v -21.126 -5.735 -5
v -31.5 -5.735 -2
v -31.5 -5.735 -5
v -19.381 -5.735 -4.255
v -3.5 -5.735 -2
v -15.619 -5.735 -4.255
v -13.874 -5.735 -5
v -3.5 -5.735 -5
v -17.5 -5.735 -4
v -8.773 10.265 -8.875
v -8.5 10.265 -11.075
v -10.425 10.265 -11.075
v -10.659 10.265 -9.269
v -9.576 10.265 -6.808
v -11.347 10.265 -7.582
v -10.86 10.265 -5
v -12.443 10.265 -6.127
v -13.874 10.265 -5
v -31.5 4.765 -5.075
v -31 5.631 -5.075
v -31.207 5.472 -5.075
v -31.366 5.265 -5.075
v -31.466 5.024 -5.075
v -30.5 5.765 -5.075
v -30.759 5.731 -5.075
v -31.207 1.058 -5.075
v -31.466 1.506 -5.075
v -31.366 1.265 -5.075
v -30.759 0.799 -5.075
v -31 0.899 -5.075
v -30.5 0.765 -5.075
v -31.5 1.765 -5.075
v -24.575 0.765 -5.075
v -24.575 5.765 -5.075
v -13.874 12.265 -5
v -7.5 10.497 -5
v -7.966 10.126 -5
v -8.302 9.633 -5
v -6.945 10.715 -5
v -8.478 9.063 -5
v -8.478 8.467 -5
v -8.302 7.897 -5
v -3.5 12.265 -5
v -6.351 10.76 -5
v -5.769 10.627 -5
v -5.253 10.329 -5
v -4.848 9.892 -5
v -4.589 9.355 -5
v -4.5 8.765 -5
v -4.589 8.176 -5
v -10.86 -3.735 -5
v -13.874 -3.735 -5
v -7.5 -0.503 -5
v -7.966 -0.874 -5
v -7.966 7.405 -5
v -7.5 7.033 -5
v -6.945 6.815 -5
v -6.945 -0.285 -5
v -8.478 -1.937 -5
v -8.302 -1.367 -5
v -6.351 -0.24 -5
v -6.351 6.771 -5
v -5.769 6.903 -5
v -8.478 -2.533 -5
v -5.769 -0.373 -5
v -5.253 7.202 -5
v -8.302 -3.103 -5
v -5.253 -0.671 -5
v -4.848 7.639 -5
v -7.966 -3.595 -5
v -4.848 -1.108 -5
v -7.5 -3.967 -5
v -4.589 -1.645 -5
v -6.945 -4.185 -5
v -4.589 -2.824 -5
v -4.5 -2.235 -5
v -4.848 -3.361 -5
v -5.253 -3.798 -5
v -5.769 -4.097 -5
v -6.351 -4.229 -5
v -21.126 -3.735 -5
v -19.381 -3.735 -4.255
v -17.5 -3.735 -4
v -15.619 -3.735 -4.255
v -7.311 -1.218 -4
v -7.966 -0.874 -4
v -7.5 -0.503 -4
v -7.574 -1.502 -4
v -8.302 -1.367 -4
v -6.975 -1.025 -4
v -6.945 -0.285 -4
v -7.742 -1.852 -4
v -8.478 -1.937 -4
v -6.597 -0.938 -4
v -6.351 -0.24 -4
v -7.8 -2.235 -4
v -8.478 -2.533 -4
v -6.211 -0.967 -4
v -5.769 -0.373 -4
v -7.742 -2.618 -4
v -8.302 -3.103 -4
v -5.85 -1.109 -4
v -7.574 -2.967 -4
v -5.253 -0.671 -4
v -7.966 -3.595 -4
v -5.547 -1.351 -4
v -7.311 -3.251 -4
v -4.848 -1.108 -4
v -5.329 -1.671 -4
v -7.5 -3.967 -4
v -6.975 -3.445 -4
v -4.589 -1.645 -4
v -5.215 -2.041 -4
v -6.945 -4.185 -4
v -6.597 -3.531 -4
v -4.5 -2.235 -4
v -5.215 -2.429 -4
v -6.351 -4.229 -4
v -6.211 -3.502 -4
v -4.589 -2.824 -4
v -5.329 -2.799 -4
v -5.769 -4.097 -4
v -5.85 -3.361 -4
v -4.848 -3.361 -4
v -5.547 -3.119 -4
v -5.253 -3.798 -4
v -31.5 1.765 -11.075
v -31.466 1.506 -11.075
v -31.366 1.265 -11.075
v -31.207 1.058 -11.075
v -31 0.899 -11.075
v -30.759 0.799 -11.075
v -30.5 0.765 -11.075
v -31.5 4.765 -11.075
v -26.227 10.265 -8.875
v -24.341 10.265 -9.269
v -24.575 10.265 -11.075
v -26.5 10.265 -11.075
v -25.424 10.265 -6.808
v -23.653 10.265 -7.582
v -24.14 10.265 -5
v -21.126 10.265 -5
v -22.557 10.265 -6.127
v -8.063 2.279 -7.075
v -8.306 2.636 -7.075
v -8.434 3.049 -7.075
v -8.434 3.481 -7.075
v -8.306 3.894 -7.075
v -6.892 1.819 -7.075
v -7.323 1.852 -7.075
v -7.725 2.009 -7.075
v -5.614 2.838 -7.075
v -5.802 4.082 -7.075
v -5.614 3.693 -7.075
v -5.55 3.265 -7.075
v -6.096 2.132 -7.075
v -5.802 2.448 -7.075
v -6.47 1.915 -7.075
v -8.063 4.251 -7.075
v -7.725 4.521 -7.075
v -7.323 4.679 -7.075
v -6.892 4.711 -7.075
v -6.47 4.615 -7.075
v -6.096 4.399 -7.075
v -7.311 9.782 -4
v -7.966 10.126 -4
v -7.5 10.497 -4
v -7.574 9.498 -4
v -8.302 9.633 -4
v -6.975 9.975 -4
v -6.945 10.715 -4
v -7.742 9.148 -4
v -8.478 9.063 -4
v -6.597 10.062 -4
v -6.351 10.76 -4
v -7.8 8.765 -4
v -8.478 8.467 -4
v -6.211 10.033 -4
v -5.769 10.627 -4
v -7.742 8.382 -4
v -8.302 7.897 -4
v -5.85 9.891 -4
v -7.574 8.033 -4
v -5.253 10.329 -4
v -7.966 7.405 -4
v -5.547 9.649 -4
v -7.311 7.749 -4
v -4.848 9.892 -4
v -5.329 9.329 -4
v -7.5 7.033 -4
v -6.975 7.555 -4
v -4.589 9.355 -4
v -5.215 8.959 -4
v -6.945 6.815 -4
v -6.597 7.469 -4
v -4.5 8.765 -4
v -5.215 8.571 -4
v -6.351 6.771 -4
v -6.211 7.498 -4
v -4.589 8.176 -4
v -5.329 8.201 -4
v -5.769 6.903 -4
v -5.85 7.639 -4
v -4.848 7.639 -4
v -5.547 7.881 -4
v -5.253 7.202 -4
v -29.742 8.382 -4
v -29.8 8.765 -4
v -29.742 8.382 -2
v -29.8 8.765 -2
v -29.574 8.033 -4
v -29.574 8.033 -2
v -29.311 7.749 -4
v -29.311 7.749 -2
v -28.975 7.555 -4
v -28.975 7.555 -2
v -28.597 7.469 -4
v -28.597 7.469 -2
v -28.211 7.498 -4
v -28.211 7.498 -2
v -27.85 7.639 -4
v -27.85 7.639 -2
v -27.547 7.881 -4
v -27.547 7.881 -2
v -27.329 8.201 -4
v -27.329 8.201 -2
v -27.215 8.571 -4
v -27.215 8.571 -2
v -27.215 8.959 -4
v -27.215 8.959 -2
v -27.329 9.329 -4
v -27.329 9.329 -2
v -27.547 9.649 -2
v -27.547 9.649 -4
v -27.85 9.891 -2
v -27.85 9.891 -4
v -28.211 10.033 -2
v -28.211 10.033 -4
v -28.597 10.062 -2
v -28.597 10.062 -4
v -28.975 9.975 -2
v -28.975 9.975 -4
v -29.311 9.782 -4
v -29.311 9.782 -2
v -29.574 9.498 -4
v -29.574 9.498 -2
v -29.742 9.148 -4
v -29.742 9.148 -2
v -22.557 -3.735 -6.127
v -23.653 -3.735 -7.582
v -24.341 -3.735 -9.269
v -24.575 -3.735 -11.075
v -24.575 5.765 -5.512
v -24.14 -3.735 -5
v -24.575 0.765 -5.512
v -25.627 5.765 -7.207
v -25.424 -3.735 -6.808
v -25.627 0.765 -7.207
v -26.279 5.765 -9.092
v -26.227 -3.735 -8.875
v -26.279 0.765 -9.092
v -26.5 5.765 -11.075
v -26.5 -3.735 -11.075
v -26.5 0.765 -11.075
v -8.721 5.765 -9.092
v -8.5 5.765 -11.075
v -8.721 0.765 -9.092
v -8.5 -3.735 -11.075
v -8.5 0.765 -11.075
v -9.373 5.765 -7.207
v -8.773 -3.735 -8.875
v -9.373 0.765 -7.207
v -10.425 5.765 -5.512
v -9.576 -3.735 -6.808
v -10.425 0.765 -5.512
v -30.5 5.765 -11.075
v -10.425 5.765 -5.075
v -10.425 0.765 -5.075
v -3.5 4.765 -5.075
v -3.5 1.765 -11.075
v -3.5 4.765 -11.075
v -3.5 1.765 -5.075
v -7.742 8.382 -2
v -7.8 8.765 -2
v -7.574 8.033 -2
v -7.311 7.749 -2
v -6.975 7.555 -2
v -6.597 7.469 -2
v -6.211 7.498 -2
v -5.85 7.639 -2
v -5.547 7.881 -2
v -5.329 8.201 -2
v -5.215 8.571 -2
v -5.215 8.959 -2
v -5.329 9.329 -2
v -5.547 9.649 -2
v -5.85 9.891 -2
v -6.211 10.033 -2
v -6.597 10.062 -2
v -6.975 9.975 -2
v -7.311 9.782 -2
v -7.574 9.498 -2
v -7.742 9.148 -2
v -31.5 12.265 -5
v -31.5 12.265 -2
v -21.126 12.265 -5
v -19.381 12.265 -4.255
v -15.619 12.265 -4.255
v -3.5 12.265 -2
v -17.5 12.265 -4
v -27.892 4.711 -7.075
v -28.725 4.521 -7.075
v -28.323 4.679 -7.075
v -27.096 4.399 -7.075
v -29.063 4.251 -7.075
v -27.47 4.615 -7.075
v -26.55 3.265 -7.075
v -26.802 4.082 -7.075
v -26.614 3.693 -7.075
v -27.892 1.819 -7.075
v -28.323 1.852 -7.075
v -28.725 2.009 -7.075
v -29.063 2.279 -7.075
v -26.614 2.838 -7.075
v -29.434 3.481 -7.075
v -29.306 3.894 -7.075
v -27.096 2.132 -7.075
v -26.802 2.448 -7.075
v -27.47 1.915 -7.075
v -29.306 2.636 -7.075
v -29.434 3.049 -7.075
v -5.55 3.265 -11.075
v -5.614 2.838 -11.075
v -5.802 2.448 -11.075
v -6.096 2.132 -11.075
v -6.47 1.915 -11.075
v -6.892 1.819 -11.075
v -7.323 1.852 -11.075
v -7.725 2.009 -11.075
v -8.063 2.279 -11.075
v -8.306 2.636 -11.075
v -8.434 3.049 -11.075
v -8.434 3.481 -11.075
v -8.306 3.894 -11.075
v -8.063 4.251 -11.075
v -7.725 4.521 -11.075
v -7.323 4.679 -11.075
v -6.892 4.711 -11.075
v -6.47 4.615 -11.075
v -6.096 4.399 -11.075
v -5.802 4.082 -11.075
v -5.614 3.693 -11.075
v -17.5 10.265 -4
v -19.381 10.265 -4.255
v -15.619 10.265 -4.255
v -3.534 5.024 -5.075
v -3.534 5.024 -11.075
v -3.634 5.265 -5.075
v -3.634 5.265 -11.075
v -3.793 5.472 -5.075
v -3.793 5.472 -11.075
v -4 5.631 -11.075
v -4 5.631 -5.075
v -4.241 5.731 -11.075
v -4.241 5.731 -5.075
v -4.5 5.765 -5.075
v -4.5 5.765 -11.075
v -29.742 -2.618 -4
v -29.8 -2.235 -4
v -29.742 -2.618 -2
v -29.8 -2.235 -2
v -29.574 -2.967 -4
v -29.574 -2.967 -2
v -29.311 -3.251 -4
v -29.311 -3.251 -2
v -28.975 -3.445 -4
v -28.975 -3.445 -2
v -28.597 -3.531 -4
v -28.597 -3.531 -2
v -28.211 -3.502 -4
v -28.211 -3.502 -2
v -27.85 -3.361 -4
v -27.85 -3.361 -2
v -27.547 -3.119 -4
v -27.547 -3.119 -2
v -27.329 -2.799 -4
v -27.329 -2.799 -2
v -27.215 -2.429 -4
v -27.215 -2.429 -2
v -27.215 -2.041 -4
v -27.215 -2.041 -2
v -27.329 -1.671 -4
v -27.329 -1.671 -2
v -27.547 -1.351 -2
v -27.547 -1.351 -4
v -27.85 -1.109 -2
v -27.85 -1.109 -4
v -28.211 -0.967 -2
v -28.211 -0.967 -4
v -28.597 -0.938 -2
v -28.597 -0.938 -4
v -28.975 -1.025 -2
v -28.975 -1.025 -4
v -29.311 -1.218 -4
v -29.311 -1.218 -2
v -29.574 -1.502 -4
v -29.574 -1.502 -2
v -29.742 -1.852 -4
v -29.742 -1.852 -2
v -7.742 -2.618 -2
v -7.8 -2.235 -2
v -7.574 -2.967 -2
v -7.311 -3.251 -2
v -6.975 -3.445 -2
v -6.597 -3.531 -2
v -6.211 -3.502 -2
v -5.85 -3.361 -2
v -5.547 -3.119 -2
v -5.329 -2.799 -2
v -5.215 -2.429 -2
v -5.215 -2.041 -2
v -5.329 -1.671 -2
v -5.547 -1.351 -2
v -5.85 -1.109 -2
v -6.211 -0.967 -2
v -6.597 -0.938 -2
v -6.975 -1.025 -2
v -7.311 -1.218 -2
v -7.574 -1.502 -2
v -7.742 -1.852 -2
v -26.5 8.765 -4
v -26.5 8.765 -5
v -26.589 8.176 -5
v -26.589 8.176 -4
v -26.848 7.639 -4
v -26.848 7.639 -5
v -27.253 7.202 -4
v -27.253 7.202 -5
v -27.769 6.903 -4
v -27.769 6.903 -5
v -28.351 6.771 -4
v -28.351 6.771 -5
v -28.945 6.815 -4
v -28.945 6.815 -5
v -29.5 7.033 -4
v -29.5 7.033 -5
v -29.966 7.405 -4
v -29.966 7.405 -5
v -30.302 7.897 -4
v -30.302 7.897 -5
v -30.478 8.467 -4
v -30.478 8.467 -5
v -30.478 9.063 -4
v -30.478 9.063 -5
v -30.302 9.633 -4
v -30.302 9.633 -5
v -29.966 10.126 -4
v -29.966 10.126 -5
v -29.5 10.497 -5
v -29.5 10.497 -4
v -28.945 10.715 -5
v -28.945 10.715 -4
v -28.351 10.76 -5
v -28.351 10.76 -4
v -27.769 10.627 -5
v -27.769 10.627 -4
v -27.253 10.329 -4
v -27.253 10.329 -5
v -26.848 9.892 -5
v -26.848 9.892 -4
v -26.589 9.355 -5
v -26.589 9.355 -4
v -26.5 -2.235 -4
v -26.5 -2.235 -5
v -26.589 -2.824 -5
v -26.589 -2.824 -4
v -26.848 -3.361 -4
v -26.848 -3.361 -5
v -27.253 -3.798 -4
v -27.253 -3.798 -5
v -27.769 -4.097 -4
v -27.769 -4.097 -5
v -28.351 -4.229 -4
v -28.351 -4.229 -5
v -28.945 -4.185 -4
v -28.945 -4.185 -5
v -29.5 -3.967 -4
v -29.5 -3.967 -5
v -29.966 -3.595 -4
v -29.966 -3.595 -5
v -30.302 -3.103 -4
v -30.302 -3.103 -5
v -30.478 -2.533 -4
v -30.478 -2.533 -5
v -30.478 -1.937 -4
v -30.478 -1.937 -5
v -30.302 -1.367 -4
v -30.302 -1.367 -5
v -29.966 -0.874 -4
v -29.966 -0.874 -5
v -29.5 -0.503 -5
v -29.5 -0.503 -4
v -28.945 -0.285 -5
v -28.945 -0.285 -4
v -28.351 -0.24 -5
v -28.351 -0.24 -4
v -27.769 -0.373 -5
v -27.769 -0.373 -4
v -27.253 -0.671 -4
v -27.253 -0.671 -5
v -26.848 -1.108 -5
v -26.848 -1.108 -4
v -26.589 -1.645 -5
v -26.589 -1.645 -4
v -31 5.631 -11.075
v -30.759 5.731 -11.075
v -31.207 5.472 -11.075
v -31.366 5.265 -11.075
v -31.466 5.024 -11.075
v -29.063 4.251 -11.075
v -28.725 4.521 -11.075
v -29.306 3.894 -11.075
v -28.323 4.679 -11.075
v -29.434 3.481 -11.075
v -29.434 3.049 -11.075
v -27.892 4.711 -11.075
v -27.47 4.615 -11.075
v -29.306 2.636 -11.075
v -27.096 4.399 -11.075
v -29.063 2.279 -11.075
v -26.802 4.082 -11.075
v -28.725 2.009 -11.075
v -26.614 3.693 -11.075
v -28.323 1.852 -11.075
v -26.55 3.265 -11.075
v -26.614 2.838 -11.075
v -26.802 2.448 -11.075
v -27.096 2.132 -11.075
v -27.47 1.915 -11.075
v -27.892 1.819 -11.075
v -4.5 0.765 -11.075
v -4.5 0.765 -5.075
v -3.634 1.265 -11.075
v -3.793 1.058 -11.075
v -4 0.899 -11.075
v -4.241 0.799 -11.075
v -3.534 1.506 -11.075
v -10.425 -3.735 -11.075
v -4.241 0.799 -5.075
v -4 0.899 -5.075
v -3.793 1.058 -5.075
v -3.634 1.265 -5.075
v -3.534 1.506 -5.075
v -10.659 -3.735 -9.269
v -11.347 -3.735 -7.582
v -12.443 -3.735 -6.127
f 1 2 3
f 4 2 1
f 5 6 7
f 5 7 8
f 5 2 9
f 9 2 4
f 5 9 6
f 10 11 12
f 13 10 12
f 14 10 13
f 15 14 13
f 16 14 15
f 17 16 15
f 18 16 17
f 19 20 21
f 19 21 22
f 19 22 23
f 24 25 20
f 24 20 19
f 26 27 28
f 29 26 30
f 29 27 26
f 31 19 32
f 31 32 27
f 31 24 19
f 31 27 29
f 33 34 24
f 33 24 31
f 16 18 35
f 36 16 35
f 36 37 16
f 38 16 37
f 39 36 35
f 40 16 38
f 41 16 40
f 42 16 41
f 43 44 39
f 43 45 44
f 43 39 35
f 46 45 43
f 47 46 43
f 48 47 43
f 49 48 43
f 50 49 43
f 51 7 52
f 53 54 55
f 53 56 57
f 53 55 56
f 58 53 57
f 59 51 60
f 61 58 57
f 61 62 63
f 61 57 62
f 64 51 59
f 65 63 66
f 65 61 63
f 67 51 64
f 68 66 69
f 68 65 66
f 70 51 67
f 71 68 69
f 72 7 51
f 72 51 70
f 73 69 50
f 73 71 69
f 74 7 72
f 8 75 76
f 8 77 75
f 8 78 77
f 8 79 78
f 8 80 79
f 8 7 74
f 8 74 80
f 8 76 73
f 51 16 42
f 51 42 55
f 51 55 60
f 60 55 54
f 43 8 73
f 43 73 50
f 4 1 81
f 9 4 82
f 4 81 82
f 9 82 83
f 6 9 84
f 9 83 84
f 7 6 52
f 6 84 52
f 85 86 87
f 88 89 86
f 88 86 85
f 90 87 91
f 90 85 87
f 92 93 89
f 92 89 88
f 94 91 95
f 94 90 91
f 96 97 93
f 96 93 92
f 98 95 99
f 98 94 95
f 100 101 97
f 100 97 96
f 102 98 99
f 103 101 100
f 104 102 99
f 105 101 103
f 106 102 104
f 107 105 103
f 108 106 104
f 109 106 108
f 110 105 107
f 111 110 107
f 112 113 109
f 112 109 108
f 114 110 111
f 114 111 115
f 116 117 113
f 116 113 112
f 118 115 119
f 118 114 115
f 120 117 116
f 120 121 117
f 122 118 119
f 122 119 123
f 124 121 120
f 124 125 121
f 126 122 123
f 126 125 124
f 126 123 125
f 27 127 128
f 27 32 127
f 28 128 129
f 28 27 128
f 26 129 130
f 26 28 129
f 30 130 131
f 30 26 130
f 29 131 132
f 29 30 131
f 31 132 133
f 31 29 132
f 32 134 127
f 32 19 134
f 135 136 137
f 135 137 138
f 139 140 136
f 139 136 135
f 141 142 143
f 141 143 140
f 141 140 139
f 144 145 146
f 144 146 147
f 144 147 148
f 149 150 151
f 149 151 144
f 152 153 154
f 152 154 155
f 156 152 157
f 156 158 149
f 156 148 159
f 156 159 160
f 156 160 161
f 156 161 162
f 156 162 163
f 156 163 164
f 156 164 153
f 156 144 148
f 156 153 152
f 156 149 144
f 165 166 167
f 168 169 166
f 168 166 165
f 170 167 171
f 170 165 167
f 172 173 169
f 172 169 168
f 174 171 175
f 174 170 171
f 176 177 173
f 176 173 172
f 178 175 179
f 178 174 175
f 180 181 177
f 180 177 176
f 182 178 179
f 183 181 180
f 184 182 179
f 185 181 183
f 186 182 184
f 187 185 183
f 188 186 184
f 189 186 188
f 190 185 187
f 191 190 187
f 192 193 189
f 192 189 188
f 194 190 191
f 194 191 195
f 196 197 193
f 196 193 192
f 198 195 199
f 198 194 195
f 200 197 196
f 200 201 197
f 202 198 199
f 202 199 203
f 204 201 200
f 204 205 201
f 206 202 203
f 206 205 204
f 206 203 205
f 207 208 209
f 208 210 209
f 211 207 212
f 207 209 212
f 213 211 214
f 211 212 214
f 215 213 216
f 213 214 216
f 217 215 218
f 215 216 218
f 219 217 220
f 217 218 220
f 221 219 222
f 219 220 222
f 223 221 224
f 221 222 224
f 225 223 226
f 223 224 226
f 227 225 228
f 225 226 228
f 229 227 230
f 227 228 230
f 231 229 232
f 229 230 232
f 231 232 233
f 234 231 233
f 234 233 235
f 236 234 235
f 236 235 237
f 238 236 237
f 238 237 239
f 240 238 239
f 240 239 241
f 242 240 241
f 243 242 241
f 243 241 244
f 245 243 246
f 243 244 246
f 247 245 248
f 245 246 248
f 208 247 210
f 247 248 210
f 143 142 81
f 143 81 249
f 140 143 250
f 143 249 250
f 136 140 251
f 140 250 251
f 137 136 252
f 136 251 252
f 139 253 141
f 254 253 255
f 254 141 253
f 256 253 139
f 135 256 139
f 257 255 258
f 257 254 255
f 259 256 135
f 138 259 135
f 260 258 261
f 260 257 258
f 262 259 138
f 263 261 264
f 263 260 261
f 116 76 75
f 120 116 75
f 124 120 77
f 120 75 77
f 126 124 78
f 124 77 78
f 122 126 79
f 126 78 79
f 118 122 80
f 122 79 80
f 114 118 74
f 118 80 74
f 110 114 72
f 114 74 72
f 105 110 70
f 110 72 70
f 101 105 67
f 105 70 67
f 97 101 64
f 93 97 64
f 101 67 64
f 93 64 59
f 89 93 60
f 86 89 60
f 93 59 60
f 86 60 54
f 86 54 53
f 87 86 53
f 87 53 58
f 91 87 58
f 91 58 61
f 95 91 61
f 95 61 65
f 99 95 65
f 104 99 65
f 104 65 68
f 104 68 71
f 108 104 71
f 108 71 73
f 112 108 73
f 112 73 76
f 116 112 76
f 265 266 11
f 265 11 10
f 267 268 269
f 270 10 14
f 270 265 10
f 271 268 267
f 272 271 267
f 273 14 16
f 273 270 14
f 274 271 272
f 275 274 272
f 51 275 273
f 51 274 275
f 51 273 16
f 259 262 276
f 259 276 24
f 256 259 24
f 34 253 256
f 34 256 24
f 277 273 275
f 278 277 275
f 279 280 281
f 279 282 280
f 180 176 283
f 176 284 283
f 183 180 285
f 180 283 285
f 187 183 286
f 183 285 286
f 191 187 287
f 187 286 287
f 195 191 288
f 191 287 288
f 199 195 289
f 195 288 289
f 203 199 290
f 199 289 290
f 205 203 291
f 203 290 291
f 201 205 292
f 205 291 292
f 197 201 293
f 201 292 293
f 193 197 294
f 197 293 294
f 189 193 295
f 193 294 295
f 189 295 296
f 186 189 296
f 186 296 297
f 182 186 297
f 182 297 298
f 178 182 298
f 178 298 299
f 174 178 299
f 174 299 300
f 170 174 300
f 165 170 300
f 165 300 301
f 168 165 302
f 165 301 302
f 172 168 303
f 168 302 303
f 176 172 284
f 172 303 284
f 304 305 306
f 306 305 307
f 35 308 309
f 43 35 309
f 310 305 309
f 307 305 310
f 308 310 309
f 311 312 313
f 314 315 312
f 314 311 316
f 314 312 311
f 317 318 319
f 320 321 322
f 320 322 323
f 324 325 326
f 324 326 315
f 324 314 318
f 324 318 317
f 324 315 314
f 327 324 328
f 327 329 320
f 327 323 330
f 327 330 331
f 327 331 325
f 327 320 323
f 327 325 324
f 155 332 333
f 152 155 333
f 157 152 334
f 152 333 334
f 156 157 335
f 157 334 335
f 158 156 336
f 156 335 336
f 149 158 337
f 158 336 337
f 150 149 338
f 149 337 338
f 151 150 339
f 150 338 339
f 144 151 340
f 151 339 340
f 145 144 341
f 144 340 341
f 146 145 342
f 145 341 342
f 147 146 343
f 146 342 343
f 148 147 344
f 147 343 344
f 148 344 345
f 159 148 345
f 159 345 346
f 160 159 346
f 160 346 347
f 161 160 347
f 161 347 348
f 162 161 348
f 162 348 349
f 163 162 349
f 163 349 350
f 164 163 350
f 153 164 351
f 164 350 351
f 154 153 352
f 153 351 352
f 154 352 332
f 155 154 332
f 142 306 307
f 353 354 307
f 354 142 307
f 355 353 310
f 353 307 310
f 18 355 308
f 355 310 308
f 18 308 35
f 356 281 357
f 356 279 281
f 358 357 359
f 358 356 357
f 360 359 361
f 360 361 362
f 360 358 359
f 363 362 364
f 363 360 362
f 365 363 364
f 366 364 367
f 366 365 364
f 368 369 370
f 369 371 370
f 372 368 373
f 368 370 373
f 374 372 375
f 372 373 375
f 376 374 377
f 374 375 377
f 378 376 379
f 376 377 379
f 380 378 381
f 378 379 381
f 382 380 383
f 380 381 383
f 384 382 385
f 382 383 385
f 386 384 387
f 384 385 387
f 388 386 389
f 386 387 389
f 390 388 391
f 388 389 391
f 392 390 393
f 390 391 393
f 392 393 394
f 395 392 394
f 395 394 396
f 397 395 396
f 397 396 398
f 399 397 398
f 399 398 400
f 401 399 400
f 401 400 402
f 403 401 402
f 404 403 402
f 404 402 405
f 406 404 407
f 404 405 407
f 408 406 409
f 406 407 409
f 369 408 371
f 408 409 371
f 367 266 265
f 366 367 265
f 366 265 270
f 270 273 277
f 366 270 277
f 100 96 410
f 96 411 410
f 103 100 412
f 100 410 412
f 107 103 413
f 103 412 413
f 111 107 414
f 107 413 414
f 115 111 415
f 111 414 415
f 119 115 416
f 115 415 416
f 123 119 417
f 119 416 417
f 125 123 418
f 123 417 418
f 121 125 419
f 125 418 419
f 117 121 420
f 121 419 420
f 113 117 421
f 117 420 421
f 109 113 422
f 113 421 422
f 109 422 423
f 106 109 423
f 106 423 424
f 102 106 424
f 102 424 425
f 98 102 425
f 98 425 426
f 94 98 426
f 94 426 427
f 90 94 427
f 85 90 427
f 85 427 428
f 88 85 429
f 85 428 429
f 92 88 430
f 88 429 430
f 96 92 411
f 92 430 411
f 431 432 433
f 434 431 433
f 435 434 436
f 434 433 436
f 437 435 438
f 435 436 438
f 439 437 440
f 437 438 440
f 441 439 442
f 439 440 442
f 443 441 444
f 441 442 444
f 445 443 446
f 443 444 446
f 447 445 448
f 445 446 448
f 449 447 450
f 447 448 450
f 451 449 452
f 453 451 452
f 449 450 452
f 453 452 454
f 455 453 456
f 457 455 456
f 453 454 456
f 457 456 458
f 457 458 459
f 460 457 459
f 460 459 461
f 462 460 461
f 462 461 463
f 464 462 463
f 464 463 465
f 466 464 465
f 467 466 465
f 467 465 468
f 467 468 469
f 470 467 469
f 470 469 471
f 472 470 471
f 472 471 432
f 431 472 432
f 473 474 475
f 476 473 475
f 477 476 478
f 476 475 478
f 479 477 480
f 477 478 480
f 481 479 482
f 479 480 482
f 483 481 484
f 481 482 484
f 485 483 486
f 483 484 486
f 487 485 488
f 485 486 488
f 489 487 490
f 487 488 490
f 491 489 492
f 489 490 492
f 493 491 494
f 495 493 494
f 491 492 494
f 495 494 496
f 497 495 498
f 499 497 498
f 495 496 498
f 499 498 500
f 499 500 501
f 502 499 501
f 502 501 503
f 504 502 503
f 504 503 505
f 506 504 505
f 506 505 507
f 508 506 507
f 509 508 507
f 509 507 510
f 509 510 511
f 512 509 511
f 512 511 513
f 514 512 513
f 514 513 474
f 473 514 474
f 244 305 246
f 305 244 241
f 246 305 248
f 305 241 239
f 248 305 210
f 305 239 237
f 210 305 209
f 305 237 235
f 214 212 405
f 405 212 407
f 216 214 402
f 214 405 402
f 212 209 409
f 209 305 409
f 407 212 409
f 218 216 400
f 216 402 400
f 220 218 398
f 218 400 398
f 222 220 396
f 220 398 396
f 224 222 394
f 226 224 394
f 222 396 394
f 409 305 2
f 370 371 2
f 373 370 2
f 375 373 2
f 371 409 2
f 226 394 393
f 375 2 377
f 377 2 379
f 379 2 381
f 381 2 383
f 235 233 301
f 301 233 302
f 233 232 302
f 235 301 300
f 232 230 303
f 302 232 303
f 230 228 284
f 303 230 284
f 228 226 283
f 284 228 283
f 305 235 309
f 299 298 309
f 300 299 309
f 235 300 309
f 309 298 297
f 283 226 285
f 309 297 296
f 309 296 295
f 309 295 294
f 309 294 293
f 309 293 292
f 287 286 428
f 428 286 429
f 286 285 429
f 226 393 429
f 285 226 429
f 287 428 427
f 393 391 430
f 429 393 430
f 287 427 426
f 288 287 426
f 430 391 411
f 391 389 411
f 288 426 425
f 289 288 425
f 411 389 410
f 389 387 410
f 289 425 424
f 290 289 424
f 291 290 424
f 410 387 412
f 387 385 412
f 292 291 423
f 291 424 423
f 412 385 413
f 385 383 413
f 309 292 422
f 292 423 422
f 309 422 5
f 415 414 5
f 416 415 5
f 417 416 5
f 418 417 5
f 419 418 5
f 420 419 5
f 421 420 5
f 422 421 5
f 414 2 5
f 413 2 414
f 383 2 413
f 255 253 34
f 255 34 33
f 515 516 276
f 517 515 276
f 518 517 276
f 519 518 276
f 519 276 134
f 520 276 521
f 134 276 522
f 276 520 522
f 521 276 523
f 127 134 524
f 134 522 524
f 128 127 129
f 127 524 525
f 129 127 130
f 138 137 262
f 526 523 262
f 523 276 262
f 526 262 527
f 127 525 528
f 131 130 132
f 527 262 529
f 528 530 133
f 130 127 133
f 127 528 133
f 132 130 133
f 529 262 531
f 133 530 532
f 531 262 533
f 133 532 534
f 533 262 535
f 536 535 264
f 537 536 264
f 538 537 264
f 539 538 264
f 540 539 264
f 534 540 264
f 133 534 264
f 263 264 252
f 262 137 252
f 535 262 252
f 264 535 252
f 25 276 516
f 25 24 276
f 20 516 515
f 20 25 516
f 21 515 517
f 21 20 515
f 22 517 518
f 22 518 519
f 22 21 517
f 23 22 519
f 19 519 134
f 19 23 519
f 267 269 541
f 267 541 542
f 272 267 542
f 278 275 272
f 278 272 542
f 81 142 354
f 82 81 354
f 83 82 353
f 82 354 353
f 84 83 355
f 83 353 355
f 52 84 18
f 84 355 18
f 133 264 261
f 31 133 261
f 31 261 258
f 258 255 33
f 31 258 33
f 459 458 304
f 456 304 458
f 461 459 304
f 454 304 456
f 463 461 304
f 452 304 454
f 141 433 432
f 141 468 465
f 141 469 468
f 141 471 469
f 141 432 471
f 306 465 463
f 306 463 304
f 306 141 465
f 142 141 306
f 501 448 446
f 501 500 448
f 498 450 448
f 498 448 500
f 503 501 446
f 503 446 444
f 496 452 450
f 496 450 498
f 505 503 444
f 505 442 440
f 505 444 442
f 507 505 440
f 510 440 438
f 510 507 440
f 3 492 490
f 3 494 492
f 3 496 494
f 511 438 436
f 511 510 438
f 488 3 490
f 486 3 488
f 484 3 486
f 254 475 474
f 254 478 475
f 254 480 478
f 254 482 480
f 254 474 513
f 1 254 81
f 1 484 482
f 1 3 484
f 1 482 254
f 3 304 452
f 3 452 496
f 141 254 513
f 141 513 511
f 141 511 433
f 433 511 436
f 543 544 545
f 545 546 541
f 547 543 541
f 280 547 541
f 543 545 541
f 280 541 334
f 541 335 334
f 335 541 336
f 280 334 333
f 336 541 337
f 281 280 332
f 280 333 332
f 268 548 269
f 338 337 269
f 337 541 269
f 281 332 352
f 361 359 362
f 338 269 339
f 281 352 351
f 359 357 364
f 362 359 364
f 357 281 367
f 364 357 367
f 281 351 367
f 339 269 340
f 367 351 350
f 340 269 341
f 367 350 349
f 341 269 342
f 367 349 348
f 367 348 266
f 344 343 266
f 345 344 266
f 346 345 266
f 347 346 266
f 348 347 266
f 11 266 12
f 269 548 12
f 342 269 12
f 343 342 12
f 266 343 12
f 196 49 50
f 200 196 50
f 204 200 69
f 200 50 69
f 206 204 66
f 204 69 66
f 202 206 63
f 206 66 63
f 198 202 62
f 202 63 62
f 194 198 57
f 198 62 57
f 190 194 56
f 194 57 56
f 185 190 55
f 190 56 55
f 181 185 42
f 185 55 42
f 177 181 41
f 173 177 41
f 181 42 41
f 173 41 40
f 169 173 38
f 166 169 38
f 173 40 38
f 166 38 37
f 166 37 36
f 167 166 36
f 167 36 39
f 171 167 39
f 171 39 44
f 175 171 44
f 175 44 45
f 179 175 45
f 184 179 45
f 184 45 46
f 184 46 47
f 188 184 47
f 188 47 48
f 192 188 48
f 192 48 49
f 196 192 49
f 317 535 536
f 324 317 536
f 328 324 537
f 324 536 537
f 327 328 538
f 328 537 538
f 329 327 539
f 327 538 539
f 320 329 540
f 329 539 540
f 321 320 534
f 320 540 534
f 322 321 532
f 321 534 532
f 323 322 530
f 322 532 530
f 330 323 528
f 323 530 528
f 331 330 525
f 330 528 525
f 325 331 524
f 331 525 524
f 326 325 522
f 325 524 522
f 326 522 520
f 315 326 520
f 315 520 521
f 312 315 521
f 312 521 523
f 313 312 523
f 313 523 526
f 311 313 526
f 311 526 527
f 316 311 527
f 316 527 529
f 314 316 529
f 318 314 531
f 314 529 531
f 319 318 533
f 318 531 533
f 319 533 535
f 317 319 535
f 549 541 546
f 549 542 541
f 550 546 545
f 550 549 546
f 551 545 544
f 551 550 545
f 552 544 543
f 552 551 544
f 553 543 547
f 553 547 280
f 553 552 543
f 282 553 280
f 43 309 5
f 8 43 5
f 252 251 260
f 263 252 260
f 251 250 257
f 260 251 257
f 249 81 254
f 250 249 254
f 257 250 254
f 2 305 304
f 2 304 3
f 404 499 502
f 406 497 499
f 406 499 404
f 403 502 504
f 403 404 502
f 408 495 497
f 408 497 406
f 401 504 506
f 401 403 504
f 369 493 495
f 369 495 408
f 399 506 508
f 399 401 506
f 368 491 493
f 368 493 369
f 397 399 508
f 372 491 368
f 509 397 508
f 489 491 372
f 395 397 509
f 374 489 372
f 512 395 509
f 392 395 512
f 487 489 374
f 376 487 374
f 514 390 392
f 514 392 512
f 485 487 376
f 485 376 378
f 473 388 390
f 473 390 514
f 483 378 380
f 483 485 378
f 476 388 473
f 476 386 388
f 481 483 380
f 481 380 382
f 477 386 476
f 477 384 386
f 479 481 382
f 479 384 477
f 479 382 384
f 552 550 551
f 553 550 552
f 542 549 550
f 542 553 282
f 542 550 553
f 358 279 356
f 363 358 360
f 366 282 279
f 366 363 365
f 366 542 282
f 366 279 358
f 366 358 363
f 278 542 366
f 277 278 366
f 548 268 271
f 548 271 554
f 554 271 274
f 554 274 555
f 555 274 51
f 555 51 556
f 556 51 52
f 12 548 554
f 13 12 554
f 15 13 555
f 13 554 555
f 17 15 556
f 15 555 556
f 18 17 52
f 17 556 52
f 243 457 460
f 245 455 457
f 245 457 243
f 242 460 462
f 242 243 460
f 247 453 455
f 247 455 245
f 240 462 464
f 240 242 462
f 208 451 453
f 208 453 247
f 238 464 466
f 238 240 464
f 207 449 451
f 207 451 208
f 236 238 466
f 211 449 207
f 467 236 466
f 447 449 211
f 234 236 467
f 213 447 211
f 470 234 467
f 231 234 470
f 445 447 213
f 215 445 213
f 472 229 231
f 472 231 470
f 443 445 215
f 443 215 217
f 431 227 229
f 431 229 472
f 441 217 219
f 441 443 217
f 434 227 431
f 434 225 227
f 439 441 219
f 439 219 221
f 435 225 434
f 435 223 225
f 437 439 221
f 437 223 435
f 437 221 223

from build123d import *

# Parameters (mm, degrees)
SKETCH048_W         = 28
SKETCH048_H         = 18
PAD032_DEPTH        = 3
SKETCH049_R         = 7.075
POCKET009_DEPTH     = 18.001
PAD033_START        = -2
PAD033_DEPTH        = 14
SKETCH051_W         = 1.925
SKETCH051_H         = 5
PAD034_DEPTH        = 6
SKETCH052_W         = 5
SKETCH052_H         = 6
PAD035_DEPTH        = 5
SKETCH053_W         = 5
SKETCH053_H         = 6
PAD036_DEPTH        = 5
HOLE004_D           = 2.6
HOLE004_DEPTH       = 25
HOLE004_CBORE_D     = 4
HOLE004_CBORE_DEPTH = 1
SKETCH056_R         = 1.45
POCKET010_DEPTH     = 4
FILLET013_R         = 1
FILLET014_R         = 1


with BuildPart() as part:
    # Sketch048 (on Face1 of CopyPad022) → Pad032 (new body)
    with BuildSketch(Plane(origin=(0, 0, -2), x_dir=(1, 0, 0), z_dir=(0, 0, -1))):
        with Locations((-18.5, 29.3848)):
            Rectangle(SKETCH048_W, SKETCH048_H)
    extrude(amount=PAD032_DEPTH)

    # Sketch049 (on Face2 of Pad032) → Pocket009 (cut, through all)
    with BuildSketch(Plane(origin=(0, -20.3848, -2), x_dir=(-1, 0, 0), z_dir=(0, 1, 0))):
        with Locations((18.5, -9.075)):
            Circle(SKETCH049_R)
    extrude(amount=-POCKET009_DEPTH, mode=Mode.SUBTRACT)

    # Sketch050 (on Face2 of Pocket009) → Pad033 (join)
    with BuildSketch(Plane(origin=(0, -38.3848, -2), x_dir=(1, 0, 0), z_dir=(0, -1, 0)).offset(PAD033_START)):
        with BuildLine():
            ThreePointArc((-11.425, -9.075), (-18.5, -2), (-25.575, -9.075))
            Line((-27.5, -9.075), (-25.575, -9.075))
            ThreePointArc((-9.5, -9.075), (-18.5, -0.075), (-27.5, -9.075))
            Line((-11.425, -9.075), (-9.5, -9.075))
        make_face()
    extrude(amount=-PAD033_DEPTH)

    # Sketch051 (on Face14 of Pad033) → Pad034 (join)
    with BuildSketch(Plane(origin=(0, 0, -11.075), x_dir=(1, 0, 0), z_dir=(0, 0, -1))):
        with Locations((-26.5375, 29.3848)):
            Rectangle(SKETCH051_W, SKETCH051_H)
        with Locations((-10.4625, 29.3848)):
            Rectangle(SKETCH051_W, SKETCH051_H)
    extrude(amount=-PAD034_DEPTH)

    # Sketch052 (on Face18 of Pad034) → Pad035 (join)
    with BuildSketch(Plane(origin=(-27.5, 0, -2), x_dir=(0, -1, 0), z_dir=(-1, 0, 0))):
        with Locations((29.3848, -6.075)):
            Rectangle(SKETCH052_W, SKETCH052_H)
    extrude(amount=PAD035_DEPTH)

    # Sketch053 (on Face17 of Pad035) → Pad036 (join)
    with BuildSketch(Plane(origin=(-9.5, 0, -2), x_dir=(0, 1, 0), z_dir=(1, 0, 0))):
        with Locations((-29.3848, -6.075)):
            Rectangle(SKETCH053_W, SKETCH053_H)
    extrude(amount=PAD036_DEPTH)

    # Hole004
    with Locations(Plane(origin=(0, 0, -5), x_dir=(1, 0, 0), z_dir=(0, 0, -1))):
        with Locations((-7.5, 34.8848), (-29.5, 34.8848), (-29.5, 23.8848), (-7.5, 23.8848)):
            CounterBoreHole(HOLE004_D / 2, HOLE004_CBORE_D / 2, HOLE004_CBORE_DEPTH, depth=HOLE004_DEPTH)

    # Sketch056 → Pocket010 (cut)
    with BuildSketch(Plane(origin=(0, 0, -11.075), x_dir=(1, 0, 0), z_dir=(0, 0, -1))):
        with Locations((-8, 29.3848)):
            Circle(SKETCH056_R)
        with Locations((-29, 29.3848)):
            Circle(SKETCH056_R)
    extrude(amount=-POCKET010_DEPTH, mode=Mode.SUBTRACT)

    # Fillet013
    fillet013_edges = [part.edges().sort_by_distance(p)[0] for p in [
        (-32.5, -31.8848, -8.075),
        (-32.5, -26.8848, -8.075),
    ]]
    fillet(fillet013_edges, radius=FILLET013_R)

    # Fillet014
    fillet014_edges = [part.edges().sort_by_distance(p)[0] for p in [
        (-4.5, -26.8848, -8.075),
        (-4.5, -31.8848, -8.075),
    ]]
    fillet(fillet014_edges, radius=FILLET014_R)


with BuildPart() as part_1:
    # Body006 placement: moved
    add(part.part.moved(Location((1, 32.65, 0))))


solid = part_1.part
